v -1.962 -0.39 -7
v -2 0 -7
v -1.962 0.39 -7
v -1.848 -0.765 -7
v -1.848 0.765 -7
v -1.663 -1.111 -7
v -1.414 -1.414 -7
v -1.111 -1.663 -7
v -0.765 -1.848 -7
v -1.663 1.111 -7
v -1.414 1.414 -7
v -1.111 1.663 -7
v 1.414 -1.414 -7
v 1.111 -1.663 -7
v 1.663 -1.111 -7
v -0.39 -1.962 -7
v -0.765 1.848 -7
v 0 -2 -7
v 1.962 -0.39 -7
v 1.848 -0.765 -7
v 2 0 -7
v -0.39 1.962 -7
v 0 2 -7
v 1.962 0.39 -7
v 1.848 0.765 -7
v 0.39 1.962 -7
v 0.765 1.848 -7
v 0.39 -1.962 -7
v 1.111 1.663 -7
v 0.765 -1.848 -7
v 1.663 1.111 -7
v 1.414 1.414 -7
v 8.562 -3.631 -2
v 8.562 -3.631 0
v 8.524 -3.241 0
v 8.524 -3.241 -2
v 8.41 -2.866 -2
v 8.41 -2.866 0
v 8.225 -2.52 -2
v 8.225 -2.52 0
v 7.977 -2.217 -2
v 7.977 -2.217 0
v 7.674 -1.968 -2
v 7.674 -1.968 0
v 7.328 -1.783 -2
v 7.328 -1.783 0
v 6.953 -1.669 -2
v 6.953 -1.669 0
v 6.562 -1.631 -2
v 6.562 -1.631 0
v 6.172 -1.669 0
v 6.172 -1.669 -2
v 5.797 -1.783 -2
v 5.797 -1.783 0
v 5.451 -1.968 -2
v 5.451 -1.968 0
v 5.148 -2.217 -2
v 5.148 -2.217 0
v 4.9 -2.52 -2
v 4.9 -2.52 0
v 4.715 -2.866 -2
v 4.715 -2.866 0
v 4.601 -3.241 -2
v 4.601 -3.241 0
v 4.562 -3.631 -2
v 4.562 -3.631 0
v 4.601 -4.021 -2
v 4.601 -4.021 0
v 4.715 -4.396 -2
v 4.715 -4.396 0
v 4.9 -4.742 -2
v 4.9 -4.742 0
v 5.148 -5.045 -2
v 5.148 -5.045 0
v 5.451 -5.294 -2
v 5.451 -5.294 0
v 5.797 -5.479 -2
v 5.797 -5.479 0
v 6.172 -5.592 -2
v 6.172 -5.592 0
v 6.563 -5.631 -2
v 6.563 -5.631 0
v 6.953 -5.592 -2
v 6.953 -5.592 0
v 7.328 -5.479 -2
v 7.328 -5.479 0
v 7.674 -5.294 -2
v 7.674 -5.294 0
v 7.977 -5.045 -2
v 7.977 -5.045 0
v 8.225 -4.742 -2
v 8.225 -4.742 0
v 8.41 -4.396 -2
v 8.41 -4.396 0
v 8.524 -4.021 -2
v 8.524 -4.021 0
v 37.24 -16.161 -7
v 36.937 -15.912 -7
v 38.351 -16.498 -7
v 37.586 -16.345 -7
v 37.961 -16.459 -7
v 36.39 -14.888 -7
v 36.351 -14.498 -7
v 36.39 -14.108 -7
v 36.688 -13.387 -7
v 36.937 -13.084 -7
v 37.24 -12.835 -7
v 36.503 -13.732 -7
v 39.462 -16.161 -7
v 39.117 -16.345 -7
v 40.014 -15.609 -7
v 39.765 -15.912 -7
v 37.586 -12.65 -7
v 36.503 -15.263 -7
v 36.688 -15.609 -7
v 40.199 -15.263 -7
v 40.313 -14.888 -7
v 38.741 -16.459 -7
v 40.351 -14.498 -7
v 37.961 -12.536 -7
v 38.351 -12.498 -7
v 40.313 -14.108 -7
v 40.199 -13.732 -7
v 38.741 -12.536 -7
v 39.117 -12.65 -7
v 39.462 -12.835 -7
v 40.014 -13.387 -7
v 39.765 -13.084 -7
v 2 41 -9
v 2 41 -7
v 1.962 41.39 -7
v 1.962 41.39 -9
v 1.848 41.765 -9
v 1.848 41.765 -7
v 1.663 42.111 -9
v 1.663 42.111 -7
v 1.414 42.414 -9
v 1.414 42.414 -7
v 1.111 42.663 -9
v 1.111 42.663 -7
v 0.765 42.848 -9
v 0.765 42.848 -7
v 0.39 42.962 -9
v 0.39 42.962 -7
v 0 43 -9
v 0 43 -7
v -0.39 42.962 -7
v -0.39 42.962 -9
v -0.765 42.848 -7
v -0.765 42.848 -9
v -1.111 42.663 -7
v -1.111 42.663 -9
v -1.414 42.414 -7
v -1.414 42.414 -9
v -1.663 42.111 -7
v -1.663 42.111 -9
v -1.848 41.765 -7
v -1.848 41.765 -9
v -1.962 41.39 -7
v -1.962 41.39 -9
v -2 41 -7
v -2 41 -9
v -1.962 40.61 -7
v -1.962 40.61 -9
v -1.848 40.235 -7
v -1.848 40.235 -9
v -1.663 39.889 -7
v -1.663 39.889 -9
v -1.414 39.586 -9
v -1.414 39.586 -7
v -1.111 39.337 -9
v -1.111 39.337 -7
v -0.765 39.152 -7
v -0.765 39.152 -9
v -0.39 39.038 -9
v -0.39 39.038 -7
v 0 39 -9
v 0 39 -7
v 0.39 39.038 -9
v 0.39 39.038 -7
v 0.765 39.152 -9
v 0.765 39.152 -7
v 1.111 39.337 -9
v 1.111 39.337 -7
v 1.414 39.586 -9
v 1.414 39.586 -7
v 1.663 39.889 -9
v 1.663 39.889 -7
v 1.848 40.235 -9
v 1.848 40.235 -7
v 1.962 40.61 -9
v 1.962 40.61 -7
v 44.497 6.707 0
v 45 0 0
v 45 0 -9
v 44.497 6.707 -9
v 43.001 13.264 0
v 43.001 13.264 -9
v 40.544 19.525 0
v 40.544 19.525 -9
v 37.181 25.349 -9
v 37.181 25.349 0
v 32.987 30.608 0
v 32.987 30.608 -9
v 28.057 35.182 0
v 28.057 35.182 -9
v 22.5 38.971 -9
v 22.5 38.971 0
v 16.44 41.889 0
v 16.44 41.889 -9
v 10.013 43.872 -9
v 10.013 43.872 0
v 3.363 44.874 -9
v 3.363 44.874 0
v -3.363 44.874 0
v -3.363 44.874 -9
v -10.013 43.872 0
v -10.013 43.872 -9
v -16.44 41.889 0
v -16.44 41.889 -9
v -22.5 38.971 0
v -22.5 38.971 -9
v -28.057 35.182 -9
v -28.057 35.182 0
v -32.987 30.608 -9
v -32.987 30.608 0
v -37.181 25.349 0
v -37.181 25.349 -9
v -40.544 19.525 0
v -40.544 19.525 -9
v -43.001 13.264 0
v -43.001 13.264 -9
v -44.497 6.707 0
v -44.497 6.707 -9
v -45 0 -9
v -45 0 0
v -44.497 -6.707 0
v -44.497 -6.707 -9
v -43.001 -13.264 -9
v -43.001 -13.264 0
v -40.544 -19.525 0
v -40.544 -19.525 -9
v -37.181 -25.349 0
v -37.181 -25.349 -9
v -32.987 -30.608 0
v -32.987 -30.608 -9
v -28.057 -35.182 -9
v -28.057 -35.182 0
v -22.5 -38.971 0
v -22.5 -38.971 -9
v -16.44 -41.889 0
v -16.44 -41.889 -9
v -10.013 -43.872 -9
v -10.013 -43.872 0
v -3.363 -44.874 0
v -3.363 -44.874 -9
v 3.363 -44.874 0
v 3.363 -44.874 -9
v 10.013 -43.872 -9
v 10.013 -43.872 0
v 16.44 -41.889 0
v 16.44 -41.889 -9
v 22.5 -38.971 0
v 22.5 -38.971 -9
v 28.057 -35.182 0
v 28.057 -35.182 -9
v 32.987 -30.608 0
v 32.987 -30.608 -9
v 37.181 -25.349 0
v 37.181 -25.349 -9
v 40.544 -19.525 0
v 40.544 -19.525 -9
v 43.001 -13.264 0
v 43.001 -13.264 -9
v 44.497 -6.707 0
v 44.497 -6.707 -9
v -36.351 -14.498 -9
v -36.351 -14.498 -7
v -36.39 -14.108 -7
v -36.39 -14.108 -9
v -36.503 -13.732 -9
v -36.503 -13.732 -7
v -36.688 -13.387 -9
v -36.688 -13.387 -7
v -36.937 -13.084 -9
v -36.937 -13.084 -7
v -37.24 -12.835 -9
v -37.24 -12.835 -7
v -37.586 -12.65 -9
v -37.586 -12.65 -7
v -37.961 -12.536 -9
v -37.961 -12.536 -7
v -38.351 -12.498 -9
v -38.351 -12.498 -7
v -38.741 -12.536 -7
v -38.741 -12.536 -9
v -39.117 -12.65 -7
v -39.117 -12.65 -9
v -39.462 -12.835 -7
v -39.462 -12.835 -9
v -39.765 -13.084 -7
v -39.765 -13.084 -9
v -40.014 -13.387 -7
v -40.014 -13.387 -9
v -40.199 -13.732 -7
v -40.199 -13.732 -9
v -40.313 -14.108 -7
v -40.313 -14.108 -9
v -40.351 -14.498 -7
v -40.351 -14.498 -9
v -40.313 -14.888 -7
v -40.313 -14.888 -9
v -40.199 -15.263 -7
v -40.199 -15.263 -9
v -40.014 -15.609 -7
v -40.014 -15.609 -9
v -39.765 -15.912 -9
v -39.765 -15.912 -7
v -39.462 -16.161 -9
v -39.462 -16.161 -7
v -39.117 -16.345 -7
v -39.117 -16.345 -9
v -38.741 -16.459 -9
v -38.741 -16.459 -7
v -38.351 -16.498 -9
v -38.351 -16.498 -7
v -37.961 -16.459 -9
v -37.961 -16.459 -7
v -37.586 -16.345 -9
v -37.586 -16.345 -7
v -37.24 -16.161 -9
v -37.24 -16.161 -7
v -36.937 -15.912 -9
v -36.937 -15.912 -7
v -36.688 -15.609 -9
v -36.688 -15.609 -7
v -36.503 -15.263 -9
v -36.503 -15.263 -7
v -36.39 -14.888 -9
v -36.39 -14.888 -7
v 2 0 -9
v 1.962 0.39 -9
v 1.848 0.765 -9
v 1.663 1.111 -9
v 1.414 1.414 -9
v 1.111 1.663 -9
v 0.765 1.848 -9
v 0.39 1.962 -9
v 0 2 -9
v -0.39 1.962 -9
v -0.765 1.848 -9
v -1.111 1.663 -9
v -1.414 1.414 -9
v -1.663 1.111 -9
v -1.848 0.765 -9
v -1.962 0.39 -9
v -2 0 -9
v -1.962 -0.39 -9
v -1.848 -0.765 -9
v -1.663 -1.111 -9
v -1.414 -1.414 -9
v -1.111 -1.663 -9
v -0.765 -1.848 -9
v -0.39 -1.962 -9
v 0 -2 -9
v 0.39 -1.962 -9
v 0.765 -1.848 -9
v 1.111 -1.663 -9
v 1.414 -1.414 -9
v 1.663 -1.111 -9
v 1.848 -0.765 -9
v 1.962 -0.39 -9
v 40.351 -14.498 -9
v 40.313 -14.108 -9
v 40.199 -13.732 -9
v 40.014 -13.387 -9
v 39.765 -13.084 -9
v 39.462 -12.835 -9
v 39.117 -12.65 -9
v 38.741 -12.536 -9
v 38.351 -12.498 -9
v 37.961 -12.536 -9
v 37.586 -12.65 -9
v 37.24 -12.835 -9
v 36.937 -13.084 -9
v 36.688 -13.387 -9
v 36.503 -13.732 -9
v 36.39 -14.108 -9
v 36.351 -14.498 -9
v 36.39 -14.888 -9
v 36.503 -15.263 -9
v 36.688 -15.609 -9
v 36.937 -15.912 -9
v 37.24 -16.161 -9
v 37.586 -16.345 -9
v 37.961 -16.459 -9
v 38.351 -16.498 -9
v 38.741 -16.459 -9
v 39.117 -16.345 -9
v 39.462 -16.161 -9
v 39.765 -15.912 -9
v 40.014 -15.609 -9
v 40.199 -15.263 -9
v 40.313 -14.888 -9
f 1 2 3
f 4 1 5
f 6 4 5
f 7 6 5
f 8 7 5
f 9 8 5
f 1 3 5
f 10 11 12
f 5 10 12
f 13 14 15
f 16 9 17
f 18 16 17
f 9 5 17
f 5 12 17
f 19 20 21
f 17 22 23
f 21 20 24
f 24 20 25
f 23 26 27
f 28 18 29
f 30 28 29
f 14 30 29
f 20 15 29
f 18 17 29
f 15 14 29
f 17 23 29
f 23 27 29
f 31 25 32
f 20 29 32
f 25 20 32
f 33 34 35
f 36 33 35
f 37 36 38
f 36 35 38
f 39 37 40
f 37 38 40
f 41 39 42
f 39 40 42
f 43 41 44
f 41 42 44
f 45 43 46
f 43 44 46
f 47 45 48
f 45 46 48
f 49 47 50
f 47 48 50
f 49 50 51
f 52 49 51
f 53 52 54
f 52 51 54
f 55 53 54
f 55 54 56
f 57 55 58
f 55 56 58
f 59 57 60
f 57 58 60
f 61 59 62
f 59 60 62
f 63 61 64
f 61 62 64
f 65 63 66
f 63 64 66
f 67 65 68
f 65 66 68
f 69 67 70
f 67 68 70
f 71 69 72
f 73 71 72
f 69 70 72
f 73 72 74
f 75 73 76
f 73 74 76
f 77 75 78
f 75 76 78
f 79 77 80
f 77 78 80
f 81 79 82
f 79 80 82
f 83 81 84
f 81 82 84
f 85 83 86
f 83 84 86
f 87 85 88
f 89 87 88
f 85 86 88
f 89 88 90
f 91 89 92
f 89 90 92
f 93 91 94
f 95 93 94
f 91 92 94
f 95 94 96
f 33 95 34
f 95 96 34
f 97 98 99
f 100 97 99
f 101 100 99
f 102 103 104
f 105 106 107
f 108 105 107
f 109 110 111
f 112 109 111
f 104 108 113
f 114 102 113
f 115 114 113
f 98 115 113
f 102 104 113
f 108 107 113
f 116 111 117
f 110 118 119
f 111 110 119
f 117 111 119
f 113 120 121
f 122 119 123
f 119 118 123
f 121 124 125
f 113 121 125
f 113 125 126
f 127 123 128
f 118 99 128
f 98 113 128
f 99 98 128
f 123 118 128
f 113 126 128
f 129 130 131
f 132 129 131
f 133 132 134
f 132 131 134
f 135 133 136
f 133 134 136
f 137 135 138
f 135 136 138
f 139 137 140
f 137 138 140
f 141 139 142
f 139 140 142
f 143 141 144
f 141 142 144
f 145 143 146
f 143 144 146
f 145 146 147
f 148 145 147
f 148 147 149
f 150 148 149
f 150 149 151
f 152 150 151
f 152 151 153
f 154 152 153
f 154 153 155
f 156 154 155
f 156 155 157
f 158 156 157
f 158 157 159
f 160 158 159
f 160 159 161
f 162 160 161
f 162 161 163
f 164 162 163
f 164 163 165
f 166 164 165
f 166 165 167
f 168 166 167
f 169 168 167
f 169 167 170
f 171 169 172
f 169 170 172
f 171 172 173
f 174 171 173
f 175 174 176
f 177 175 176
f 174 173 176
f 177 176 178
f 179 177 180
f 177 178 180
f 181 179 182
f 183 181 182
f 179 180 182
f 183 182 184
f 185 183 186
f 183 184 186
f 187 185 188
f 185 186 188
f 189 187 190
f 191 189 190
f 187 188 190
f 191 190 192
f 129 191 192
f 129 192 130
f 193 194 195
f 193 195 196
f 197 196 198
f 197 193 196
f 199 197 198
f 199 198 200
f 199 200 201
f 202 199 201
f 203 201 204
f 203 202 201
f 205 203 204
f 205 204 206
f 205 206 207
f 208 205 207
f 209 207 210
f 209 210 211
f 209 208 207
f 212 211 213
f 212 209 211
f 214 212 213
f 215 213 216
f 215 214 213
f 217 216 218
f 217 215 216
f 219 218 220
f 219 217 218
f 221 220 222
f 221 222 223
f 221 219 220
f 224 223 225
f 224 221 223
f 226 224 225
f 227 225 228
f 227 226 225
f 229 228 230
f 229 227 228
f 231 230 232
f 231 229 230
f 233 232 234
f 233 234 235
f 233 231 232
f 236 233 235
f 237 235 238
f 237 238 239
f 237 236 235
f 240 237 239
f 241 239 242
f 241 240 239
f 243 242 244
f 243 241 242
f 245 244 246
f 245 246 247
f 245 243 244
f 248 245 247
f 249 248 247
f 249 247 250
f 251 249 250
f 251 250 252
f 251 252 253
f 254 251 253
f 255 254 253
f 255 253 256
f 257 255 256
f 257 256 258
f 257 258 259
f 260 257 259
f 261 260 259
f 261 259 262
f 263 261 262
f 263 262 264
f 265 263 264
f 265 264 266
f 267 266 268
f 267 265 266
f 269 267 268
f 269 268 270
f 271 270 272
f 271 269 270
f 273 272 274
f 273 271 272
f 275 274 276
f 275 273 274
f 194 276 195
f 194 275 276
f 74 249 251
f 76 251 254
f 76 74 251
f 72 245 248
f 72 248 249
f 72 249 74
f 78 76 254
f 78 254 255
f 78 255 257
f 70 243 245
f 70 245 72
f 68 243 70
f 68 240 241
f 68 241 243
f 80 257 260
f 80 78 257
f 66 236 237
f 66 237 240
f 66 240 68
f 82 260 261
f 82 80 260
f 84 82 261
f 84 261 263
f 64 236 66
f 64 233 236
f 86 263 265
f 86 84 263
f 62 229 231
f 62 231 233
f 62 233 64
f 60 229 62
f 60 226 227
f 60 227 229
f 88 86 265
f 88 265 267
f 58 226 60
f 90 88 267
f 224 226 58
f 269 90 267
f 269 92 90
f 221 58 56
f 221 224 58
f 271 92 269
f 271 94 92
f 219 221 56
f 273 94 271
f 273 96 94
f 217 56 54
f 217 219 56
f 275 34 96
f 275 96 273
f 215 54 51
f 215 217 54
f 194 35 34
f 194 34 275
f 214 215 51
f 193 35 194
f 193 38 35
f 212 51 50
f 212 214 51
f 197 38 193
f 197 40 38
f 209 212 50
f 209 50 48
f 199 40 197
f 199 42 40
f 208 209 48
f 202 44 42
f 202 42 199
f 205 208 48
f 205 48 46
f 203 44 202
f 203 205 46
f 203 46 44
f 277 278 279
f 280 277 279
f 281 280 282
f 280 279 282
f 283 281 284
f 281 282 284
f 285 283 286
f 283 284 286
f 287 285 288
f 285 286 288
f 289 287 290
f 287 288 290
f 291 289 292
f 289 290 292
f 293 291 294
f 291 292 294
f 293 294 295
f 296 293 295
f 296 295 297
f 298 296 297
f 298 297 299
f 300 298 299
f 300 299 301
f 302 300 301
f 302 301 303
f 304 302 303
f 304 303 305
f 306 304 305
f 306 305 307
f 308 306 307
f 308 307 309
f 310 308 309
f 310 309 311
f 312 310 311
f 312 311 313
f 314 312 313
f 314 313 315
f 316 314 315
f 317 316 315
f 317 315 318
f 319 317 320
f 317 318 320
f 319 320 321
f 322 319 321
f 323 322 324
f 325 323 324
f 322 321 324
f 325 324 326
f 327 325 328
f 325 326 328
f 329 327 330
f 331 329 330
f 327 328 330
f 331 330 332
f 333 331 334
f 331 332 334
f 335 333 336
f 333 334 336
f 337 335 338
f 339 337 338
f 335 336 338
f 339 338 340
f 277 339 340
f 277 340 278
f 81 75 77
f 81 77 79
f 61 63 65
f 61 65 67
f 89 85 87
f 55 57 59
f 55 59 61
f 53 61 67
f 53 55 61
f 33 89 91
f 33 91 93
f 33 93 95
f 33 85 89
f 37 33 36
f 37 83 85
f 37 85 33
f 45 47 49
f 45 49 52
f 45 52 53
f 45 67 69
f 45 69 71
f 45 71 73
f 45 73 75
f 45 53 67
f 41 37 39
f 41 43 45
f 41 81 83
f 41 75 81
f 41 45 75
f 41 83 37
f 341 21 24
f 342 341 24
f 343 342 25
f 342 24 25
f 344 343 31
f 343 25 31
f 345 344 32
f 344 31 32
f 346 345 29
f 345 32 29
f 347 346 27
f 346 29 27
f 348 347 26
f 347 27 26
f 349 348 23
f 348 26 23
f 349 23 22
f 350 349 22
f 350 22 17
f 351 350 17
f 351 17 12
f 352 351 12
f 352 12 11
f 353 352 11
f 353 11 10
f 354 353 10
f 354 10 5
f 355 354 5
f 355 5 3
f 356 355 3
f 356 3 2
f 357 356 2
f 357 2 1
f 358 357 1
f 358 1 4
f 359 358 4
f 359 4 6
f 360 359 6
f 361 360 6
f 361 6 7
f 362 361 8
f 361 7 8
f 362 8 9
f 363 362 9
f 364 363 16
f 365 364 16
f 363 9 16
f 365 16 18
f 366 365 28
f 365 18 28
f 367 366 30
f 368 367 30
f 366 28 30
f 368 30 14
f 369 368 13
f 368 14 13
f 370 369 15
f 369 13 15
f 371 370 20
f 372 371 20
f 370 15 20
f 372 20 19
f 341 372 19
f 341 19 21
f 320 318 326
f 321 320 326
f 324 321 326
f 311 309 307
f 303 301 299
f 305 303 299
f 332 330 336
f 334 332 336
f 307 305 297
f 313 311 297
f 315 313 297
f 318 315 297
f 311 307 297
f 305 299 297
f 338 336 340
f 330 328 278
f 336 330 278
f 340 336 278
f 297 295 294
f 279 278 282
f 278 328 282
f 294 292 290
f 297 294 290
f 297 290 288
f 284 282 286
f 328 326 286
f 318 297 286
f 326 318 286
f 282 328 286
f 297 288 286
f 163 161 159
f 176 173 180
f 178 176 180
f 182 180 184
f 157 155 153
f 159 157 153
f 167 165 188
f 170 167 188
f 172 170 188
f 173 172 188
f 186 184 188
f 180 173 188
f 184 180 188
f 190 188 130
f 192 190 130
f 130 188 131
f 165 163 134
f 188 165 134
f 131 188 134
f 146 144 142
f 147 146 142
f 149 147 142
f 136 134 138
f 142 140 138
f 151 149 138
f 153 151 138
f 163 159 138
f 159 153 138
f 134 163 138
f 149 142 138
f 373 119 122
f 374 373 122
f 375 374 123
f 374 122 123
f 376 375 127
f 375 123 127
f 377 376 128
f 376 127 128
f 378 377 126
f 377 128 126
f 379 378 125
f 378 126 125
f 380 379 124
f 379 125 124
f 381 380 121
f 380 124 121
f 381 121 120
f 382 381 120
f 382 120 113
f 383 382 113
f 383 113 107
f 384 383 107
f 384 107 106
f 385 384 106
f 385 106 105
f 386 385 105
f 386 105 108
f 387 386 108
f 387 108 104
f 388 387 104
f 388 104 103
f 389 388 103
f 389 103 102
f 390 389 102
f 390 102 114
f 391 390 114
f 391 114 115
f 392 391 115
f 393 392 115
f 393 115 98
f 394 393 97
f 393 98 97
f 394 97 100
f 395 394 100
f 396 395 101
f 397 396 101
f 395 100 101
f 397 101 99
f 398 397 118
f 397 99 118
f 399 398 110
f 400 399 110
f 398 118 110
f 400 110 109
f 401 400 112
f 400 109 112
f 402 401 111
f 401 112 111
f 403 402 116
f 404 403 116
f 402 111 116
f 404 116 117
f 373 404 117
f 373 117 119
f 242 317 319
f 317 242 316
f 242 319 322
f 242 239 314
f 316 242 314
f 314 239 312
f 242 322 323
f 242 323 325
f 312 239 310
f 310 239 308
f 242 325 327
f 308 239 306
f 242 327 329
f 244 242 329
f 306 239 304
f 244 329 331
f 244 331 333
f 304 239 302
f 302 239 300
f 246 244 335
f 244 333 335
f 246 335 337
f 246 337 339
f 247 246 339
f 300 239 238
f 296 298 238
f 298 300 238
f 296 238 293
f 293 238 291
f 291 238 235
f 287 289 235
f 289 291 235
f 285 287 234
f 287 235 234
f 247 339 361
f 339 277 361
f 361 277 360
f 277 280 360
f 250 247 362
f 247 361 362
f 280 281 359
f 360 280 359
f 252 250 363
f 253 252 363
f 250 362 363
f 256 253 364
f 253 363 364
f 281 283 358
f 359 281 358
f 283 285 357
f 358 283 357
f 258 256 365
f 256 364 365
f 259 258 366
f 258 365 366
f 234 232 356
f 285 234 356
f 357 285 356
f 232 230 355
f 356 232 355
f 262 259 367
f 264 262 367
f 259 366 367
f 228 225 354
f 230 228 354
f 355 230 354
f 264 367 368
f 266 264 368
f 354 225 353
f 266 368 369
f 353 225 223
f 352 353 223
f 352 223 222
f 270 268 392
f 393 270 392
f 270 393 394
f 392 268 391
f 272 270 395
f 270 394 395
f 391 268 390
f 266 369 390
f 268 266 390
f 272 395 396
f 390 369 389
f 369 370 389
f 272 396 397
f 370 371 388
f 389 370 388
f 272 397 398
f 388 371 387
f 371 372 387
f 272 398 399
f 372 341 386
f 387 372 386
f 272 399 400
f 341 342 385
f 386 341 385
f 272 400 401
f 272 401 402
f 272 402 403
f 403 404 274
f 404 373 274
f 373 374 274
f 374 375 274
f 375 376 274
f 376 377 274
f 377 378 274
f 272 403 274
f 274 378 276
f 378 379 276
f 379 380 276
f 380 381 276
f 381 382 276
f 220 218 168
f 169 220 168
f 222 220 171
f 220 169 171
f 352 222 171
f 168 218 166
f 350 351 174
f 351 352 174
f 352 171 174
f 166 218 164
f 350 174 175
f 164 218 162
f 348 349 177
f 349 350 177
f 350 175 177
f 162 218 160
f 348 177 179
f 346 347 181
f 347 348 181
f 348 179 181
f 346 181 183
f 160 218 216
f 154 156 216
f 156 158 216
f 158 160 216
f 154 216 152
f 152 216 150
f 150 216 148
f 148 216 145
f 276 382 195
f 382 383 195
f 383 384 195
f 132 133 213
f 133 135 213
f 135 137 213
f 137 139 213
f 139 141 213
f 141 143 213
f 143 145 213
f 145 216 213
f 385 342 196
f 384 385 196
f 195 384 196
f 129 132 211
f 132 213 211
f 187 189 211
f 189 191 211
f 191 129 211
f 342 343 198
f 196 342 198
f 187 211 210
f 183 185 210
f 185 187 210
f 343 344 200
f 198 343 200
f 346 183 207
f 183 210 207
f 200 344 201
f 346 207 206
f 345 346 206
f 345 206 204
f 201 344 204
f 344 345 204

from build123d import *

# Parameters (mm, degrees)
F0_R     = 45
F0_R_2   = 2
F1_DEPTH = 9
F2_DEPTH = 7
F3_DEPTH = 2


with BuildPart() as f1:
    # F0 (on Top) → F1 (new body)
    with BuildSketch(Plane.XY):
        Circle(F0_R)
        with Locations((-38.351216, -14.497732)):
            Circle(F0_R_2, mode=Mode.SUBTRACT)
        with Locations((6.5625, -3.630922)):
            Circle(F0_R_2, mode=Mode.SUBTRACT)
        with Locations((38.351216, -14.497732)):
            Circle(F0_R_2, mode=Mode.SUBTRACT)
        Circle(F0_R_2, mode=Mode.SUBTRACT)
        with Locations((0, 41)):
            Circle(F0_R_2, mode=Mode.SUBTRACT)
        with Locations((6.5625, -3.630922)):
            Circle(F0_R_2)
    extrude(amount=-F1_DEPTH)

    # F0 (on Top) → F2 (join)
    with BuildSketch(Plane.XY):
        Circle(F0_R_2)
        with Locations((0, 41)):
            Circle(F0_R_2)
        with Locations((38.351216, -14.497732)):
            Circle(F0_R_2)
        with Locations((-38.351216, -14.497732)):
            Circle(F0_R_2)
    extrude(amount=-F2_DEPTH)

    # F0 (on Top) → F3 (cut)
    with BuildSketch(Plane.XY):
        with Locations((6.5625, -3.630922)):
            Circle(F0_R_2)
    extrude(amount=-F3_DEPTH, mode=Mode.SUBTRACT)


solid = f1.part
